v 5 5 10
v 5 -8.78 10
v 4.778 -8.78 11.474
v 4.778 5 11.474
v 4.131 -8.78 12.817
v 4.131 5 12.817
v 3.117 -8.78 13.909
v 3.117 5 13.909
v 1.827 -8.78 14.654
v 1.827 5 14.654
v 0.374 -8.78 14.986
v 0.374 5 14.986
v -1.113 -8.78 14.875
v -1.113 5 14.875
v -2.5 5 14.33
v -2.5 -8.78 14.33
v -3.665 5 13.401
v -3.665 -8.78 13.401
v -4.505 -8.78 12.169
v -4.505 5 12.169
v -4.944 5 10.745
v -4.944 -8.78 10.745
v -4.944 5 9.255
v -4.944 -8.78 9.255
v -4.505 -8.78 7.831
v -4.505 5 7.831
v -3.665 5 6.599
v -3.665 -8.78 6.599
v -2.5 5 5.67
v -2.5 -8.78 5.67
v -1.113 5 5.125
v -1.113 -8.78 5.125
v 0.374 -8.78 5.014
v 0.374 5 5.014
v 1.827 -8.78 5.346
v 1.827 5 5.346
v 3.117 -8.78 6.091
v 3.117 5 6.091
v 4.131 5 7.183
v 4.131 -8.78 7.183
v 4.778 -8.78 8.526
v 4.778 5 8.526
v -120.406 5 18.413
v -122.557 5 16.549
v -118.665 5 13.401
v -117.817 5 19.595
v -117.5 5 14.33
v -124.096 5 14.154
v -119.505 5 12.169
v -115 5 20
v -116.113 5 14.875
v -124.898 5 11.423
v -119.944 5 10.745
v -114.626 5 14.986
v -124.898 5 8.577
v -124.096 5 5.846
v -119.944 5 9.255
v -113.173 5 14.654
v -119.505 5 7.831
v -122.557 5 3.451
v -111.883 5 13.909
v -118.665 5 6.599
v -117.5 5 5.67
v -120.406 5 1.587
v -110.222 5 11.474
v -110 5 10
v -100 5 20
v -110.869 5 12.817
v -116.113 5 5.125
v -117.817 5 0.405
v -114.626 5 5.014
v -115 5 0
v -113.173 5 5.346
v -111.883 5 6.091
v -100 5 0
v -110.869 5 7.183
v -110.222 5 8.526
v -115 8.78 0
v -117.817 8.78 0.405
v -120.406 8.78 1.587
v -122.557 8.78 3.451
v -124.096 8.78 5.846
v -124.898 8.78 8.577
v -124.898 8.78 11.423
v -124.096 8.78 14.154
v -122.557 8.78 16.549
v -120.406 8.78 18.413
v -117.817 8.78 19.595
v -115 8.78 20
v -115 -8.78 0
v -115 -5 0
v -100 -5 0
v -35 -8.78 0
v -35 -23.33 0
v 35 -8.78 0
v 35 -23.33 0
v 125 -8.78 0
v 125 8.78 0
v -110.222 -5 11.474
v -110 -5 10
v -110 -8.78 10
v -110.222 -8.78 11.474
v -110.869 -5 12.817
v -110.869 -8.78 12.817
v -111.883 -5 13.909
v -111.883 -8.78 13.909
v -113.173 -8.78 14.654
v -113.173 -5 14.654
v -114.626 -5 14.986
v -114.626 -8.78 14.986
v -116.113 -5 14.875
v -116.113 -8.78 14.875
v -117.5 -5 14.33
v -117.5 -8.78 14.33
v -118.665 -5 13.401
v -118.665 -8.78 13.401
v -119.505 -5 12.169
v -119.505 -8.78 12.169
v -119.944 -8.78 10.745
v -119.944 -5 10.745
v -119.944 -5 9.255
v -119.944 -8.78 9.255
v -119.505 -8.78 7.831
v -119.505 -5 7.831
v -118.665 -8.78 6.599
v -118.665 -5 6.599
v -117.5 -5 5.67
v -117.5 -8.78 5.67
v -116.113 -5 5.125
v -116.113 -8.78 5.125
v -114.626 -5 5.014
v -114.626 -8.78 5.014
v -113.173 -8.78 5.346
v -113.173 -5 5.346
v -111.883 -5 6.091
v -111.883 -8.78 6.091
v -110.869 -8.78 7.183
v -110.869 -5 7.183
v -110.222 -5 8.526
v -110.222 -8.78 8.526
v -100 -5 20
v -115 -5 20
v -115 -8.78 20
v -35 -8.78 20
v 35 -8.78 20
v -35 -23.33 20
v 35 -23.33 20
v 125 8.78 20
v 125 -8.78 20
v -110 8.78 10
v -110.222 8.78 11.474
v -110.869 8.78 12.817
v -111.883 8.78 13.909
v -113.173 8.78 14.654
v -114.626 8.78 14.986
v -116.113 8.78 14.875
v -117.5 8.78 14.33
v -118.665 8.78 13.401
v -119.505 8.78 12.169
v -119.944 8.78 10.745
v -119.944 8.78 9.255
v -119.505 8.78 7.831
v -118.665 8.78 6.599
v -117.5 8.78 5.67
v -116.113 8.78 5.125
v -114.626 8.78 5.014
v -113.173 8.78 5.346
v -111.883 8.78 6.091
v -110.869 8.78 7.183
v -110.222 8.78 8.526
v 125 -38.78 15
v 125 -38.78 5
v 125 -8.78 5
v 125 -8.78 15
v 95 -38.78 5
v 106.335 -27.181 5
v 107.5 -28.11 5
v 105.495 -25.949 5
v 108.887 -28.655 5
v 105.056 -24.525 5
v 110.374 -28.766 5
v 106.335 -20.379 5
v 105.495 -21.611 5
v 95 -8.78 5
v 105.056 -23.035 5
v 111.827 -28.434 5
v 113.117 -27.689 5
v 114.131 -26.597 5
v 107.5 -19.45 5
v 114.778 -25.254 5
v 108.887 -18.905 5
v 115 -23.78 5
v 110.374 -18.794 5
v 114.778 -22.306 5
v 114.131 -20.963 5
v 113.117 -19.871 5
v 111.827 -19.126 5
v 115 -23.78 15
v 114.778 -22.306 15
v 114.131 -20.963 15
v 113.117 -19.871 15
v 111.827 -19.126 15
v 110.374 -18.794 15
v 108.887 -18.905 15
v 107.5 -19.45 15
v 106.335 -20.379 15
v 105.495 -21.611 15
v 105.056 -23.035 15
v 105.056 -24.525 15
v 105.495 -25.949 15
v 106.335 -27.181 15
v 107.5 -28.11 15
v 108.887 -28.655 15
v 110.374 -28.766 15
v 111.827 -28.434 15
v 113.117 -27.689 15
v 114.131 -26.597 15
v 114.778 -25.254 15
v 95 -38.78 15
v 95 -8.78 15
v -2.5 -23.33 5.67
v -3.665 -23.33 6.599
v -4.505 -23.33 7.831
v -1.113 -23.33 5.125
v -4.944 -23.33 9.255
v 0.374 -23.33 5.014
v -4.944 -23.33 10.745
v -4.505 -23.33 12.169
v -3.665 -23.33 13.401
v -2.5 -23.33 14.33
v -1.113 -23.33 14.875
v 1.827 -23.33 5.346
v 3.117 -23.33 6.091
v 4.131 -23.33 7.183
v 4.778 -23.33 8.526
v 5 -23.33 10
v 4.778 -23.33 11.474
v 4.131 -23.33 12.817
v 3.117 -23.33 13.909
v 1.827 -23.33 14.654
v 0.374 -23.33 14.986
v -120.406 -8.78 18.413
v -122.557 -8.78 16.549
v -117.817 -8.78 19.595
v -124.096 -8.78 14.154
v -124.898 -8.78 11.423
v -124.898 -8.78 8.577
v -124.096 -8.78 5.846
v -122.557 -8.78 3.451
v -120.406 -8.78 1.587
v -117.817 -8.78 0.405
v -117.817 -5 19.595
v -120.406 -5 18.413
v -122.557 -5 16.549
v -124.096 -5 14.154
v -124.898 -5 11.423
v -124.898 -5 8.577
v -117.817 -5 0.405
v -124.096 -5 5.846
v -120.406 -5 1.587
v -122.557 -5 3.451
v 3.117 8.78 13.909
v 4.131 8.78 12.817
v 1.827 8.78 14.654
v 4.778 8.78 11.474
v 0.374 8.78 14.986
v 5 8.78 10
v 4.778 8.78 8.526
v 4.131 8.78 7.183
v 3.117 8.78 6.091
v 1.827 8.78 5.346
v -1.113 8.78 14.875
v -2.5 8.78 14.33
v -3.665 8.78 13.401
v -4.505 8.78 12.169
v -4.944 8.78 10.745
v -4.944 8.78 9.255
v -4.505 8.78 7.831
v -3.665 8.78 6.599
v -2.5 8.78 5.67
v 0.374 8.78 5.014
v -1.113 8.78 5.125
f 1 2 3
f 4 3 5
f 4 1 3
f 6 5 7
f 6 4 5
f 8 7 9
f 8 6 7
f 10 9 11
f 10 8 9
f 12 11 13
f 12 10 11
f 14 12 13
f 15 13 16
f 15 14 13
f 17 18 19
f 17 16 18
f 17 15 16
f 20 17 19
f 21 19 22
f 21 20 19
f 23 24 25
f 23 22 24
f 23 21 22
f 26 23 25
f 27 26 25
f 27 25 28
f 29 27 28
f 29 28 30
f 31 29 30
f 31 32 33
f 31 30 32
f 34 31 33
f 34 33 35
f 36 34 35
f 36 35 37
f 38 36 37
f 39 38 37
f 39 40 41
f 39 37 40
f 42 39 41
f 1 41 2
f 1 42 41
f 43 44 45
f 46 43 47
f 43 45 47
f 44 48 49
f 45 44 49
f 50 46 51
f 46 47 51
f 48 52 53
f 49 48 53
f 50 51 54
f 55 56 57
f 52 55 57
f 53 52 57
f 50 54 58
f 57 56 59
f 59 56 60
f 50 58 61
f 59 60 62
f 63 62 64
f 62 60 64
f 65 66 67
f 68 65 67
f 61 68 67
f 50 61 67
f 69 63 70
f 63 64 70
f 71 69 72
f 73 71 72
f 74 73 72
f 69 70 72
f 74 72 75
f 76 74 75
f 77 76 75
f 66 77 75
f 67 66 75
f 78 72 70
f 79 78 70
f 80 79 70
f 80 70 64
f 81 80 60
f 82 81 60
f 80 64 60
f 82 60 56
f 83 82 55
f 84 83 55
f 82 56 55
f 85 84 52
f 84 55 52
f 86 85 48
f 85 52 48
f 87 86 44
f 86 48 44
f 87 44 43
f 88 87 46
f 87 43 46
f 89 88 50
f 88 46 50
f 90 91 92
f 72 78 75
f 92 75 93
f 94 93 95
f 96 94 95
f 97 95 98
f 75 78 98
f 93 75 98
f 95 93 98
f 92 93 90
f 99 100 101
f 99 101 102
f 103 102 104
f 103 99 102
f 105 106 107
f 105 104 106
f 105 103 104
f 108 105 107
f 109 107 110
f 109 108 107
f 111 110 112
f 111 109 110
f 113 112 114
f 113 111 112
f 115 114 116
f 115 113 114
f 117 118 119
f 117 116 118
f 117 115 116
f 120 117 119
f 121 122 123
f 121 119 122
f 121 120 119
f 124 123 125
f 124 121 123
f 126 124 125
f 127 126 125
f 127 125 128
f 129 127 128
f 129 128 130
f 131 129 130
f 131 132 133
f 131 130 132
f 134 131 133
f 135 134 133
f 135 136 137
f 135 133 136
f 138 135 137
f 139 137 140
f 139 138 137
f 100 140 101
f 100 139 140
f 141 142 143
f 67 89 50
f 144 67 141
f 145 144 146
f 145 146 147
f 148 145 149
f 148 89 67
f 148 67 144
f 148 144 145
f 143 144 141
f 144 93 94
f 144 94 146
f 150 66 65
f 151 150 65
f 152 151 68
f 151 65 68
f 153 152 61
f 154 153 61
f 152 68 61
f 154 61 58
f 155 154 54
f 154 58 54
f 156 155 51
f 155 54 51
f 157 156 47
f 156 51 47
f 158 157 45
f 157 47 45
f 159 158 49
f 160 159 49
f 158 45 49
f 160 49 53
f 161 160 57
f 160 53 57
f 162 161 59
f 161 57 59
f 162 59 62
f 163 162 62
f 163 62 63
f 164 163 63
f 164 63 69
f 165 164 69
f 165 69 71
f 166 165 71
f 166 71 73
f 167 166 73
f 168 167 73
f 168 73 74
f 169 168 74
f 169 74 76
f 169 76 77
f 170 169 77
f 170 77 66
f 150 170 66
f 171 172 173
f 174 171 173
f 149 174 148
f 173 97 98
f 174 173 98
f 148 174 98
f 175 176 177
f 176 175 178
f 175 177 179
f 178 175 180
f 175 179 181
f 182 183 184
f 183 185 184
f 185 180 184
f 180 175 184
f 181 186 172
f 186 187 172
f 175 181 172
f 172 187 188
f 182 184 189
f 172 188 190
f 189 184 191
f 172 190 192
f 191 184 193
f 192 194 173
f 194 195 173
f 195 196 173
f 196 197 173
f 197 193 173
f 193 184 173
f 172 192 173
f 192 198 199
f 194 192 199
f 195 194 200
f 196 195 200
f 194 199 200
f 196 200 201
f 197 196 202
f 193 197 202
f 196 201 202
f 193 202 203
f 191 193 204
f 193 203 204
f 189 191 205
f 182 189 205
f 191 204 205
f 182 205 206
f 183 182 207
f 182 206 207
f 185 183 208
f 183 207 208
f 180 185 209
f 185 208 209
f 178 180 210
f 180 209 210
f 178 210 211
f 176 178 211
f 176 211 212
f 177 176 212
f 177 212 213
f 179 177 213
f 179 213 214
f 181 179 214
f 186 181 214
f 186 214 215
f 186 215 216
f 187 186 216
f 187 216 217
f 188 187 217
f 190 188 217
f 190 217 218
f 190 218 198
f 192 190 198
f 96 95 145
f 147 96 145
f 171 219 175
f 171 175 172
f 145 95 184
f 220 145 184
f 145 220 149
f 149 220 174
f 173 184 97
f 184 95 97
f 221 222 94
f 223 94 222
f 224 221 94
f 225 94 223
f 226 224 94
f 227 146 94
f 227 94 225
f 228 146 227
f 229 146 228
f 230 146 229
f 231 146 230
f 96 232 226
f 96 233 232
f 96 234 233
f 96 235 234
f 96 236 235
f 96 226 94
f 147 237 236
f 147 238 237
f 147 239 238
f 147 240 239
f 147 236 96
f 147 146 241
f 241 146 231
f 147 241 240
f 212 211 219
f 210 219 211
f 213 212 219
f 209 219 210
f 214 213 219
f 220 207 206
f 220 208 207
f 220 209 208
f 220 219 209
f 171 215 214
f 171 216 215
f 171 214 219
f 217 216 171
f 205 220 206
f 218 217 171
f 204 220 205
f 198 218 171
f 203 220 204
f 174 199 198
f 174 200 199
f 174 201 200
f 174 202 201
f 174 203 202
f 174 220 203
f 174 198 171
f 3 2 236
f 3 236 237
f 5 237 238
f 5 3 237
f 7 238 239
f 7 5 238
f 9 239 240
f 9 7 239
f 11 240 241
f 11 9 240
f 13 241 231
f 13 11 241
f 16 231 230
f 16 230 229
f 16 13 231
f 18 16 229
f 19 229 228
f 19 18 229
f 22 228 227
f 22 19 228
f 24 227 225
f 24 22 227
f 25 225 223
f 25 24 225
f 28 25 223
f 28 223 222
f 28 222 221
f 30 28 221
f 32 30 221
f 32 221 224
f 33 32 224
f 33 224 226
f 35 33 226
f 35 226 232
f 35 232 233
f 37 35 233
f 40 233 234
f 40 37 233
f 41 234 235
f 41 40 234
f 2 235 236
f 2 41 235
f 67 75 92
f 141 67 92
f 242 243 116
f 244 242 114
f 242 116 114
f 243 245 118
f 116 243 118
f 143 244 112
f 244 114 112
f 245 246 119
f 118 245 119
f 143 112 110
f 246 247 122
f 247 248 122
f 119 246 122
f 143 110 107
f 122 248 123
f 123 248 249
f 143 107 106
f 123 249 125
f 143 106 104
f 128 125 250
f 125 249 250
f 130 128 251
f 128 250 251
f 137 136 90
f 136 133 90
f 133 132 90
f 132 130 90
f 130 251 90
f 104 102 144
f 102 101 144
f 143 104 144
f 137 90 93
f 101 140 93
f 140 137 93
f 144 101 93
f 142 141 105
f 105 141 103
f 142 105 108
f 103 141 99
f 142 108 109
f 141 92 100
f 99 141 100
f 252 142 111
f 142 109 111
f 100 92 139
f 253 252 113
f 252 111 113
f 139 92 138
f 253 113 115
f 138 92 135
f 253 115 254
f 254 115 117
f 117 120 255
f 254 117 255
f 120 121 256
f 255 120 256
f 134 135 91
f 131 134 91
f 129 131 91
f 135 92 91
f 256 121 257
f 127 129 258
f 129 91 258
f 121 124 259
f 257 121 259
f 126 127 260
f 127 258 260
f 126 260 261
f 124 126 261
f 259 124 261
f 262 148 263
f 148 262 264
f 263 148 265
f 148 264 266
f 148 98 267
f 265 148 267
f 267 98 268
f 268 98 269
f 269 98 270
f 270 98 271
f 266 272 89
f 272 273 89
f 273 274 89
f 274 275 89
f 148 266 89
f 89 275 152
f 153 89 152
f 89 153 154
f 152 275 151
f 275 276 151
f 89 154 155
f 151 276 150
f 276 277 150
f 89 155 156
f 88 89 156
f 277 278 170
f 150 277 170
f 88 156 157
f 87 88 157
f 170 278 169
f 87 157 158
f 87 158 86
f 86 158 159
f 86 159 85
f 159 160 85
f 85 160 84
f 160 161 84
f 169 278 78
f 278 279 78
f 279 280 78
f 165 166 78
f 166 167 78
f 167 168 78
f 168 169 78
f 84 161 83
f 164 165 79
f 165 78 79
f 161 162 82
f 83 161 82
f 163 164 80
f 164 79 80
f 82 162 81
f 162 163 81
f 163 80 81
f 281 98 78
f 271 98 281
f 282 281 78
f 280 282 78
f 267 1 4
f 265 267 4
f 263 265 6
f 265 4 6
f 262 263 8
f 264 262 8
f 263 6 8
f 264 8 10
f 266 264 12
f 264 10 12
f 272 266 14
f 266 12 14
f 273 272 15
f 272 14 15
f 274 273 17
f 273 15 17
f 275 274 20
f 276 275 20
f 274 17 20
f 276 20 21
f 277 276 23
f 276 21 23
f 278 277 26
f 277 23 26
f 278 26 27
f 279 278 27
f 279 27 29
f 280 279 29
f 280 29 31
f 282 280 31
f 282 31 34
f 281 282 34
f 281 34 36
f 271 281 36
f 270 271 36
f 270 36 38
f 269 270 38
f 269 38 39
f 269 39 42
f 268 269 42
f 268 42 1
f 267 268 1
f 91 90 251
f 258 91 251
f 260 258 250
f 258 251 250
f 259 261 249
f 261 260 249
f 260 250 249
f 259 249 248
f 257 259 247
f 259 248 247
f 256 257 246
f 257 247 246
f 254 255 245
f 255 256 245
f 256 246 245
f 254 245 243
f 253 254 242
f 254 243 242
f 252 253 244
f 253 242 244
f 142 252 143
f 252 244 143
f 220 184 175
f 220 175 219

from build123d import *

# Parameters (mm, degrees)
BOSS_EXTRUDE1_DEPTH = 20
SKETCH2_R           = 5
CUT_EXTRUDE1_DEPTH  = 20
SKETCH3_W           = 70
SKETCH3_H           = 20
SKETCH3_R           = 5
BOSS_EXTRUDE2_DEPTH = 14.55
SKETCH4_W           = 30
SKETCH4_H           = 10
BOSS_EXTRUDE3_DEPTH = 30
SKETCH5_R           = 5
CUT_EXTRUDE2_DEPTH  = 20


with BuildPart() as part:
    # Sketch1 → Boss-Extrude1 (new body)
    with BuildSketch(Plane.XY):
        Polygon((-125, -8.78), (125, -8.78), (125, 8.78), (-125, 8.78), (-125, 5), (-100, 5), (-100, -5), (-125, -5), align=None)
    extrude(amount=BOSS_EXTRUDE1_DEPTH)

    # Sketch2 → Cut-Extrude1 (cut, symmetric)
    with BuildSketch(Plane.XZ.offset(-5)):
        with Locations((-115, 10)):
            Circle(SKETCH2_R)
        with Locations((0, 10)):
            Circle(SKETCH2_R)
        with BuildLine():
            Line((-115, 20), (-115, 22.029141536))
            Line((-115, 22.029141536), (-130, 22.029141536))
            Line((-130, 22.029141536), (-130, -2.19309391))
            Line((-130, -2.19309391), (-115, -2.19309391))
            Line((-115, -2.19309391), (-115, 0))
            ThreePointArc((-115, 0), (-125, 10), (-115, 20))
        make_face()
    extrude(amount=CUT_EXTRUDE1_DEPTH, both=True, mode=Mode.SUBTRACT)

    # Sketch3 → Boss-Extrude2 (add)
    with BuildSketch(Plane.XZ.offset(8.78)):
        with Locations((0, 10)):
            Rectangle(SKETCH3_W, SKETCH3_H)
        with Locations((0, 10)):
            Circle(SKETCH3_R, mode=Mode.SUBTRACT)
    extrude(amount=BOSS_EXTRUDE2_DEPTH)

    # Sketch4 → Boss-Extrude3 (add)
    with BuildSketch(Plane.XZ.offset(8.78)):
        with Locations((110, 10)):
            Rectangle(SKETCH4_W, SKETCH4_H)
    extrude(amount=BOSS_EXTRUDE3_DEPTH)

    # Sketch5 → Cut-Extrude2 (cut)
    with BuildSketch(Plane.XY.offset(15)):
        with Locations((110, -23.78)):
            Circle(SKETCH5_R)
    extrude(amount=-CUT_EXTRUDE2_DEPTH, mode=Mode.SUBTRACT)


solid = part.part
